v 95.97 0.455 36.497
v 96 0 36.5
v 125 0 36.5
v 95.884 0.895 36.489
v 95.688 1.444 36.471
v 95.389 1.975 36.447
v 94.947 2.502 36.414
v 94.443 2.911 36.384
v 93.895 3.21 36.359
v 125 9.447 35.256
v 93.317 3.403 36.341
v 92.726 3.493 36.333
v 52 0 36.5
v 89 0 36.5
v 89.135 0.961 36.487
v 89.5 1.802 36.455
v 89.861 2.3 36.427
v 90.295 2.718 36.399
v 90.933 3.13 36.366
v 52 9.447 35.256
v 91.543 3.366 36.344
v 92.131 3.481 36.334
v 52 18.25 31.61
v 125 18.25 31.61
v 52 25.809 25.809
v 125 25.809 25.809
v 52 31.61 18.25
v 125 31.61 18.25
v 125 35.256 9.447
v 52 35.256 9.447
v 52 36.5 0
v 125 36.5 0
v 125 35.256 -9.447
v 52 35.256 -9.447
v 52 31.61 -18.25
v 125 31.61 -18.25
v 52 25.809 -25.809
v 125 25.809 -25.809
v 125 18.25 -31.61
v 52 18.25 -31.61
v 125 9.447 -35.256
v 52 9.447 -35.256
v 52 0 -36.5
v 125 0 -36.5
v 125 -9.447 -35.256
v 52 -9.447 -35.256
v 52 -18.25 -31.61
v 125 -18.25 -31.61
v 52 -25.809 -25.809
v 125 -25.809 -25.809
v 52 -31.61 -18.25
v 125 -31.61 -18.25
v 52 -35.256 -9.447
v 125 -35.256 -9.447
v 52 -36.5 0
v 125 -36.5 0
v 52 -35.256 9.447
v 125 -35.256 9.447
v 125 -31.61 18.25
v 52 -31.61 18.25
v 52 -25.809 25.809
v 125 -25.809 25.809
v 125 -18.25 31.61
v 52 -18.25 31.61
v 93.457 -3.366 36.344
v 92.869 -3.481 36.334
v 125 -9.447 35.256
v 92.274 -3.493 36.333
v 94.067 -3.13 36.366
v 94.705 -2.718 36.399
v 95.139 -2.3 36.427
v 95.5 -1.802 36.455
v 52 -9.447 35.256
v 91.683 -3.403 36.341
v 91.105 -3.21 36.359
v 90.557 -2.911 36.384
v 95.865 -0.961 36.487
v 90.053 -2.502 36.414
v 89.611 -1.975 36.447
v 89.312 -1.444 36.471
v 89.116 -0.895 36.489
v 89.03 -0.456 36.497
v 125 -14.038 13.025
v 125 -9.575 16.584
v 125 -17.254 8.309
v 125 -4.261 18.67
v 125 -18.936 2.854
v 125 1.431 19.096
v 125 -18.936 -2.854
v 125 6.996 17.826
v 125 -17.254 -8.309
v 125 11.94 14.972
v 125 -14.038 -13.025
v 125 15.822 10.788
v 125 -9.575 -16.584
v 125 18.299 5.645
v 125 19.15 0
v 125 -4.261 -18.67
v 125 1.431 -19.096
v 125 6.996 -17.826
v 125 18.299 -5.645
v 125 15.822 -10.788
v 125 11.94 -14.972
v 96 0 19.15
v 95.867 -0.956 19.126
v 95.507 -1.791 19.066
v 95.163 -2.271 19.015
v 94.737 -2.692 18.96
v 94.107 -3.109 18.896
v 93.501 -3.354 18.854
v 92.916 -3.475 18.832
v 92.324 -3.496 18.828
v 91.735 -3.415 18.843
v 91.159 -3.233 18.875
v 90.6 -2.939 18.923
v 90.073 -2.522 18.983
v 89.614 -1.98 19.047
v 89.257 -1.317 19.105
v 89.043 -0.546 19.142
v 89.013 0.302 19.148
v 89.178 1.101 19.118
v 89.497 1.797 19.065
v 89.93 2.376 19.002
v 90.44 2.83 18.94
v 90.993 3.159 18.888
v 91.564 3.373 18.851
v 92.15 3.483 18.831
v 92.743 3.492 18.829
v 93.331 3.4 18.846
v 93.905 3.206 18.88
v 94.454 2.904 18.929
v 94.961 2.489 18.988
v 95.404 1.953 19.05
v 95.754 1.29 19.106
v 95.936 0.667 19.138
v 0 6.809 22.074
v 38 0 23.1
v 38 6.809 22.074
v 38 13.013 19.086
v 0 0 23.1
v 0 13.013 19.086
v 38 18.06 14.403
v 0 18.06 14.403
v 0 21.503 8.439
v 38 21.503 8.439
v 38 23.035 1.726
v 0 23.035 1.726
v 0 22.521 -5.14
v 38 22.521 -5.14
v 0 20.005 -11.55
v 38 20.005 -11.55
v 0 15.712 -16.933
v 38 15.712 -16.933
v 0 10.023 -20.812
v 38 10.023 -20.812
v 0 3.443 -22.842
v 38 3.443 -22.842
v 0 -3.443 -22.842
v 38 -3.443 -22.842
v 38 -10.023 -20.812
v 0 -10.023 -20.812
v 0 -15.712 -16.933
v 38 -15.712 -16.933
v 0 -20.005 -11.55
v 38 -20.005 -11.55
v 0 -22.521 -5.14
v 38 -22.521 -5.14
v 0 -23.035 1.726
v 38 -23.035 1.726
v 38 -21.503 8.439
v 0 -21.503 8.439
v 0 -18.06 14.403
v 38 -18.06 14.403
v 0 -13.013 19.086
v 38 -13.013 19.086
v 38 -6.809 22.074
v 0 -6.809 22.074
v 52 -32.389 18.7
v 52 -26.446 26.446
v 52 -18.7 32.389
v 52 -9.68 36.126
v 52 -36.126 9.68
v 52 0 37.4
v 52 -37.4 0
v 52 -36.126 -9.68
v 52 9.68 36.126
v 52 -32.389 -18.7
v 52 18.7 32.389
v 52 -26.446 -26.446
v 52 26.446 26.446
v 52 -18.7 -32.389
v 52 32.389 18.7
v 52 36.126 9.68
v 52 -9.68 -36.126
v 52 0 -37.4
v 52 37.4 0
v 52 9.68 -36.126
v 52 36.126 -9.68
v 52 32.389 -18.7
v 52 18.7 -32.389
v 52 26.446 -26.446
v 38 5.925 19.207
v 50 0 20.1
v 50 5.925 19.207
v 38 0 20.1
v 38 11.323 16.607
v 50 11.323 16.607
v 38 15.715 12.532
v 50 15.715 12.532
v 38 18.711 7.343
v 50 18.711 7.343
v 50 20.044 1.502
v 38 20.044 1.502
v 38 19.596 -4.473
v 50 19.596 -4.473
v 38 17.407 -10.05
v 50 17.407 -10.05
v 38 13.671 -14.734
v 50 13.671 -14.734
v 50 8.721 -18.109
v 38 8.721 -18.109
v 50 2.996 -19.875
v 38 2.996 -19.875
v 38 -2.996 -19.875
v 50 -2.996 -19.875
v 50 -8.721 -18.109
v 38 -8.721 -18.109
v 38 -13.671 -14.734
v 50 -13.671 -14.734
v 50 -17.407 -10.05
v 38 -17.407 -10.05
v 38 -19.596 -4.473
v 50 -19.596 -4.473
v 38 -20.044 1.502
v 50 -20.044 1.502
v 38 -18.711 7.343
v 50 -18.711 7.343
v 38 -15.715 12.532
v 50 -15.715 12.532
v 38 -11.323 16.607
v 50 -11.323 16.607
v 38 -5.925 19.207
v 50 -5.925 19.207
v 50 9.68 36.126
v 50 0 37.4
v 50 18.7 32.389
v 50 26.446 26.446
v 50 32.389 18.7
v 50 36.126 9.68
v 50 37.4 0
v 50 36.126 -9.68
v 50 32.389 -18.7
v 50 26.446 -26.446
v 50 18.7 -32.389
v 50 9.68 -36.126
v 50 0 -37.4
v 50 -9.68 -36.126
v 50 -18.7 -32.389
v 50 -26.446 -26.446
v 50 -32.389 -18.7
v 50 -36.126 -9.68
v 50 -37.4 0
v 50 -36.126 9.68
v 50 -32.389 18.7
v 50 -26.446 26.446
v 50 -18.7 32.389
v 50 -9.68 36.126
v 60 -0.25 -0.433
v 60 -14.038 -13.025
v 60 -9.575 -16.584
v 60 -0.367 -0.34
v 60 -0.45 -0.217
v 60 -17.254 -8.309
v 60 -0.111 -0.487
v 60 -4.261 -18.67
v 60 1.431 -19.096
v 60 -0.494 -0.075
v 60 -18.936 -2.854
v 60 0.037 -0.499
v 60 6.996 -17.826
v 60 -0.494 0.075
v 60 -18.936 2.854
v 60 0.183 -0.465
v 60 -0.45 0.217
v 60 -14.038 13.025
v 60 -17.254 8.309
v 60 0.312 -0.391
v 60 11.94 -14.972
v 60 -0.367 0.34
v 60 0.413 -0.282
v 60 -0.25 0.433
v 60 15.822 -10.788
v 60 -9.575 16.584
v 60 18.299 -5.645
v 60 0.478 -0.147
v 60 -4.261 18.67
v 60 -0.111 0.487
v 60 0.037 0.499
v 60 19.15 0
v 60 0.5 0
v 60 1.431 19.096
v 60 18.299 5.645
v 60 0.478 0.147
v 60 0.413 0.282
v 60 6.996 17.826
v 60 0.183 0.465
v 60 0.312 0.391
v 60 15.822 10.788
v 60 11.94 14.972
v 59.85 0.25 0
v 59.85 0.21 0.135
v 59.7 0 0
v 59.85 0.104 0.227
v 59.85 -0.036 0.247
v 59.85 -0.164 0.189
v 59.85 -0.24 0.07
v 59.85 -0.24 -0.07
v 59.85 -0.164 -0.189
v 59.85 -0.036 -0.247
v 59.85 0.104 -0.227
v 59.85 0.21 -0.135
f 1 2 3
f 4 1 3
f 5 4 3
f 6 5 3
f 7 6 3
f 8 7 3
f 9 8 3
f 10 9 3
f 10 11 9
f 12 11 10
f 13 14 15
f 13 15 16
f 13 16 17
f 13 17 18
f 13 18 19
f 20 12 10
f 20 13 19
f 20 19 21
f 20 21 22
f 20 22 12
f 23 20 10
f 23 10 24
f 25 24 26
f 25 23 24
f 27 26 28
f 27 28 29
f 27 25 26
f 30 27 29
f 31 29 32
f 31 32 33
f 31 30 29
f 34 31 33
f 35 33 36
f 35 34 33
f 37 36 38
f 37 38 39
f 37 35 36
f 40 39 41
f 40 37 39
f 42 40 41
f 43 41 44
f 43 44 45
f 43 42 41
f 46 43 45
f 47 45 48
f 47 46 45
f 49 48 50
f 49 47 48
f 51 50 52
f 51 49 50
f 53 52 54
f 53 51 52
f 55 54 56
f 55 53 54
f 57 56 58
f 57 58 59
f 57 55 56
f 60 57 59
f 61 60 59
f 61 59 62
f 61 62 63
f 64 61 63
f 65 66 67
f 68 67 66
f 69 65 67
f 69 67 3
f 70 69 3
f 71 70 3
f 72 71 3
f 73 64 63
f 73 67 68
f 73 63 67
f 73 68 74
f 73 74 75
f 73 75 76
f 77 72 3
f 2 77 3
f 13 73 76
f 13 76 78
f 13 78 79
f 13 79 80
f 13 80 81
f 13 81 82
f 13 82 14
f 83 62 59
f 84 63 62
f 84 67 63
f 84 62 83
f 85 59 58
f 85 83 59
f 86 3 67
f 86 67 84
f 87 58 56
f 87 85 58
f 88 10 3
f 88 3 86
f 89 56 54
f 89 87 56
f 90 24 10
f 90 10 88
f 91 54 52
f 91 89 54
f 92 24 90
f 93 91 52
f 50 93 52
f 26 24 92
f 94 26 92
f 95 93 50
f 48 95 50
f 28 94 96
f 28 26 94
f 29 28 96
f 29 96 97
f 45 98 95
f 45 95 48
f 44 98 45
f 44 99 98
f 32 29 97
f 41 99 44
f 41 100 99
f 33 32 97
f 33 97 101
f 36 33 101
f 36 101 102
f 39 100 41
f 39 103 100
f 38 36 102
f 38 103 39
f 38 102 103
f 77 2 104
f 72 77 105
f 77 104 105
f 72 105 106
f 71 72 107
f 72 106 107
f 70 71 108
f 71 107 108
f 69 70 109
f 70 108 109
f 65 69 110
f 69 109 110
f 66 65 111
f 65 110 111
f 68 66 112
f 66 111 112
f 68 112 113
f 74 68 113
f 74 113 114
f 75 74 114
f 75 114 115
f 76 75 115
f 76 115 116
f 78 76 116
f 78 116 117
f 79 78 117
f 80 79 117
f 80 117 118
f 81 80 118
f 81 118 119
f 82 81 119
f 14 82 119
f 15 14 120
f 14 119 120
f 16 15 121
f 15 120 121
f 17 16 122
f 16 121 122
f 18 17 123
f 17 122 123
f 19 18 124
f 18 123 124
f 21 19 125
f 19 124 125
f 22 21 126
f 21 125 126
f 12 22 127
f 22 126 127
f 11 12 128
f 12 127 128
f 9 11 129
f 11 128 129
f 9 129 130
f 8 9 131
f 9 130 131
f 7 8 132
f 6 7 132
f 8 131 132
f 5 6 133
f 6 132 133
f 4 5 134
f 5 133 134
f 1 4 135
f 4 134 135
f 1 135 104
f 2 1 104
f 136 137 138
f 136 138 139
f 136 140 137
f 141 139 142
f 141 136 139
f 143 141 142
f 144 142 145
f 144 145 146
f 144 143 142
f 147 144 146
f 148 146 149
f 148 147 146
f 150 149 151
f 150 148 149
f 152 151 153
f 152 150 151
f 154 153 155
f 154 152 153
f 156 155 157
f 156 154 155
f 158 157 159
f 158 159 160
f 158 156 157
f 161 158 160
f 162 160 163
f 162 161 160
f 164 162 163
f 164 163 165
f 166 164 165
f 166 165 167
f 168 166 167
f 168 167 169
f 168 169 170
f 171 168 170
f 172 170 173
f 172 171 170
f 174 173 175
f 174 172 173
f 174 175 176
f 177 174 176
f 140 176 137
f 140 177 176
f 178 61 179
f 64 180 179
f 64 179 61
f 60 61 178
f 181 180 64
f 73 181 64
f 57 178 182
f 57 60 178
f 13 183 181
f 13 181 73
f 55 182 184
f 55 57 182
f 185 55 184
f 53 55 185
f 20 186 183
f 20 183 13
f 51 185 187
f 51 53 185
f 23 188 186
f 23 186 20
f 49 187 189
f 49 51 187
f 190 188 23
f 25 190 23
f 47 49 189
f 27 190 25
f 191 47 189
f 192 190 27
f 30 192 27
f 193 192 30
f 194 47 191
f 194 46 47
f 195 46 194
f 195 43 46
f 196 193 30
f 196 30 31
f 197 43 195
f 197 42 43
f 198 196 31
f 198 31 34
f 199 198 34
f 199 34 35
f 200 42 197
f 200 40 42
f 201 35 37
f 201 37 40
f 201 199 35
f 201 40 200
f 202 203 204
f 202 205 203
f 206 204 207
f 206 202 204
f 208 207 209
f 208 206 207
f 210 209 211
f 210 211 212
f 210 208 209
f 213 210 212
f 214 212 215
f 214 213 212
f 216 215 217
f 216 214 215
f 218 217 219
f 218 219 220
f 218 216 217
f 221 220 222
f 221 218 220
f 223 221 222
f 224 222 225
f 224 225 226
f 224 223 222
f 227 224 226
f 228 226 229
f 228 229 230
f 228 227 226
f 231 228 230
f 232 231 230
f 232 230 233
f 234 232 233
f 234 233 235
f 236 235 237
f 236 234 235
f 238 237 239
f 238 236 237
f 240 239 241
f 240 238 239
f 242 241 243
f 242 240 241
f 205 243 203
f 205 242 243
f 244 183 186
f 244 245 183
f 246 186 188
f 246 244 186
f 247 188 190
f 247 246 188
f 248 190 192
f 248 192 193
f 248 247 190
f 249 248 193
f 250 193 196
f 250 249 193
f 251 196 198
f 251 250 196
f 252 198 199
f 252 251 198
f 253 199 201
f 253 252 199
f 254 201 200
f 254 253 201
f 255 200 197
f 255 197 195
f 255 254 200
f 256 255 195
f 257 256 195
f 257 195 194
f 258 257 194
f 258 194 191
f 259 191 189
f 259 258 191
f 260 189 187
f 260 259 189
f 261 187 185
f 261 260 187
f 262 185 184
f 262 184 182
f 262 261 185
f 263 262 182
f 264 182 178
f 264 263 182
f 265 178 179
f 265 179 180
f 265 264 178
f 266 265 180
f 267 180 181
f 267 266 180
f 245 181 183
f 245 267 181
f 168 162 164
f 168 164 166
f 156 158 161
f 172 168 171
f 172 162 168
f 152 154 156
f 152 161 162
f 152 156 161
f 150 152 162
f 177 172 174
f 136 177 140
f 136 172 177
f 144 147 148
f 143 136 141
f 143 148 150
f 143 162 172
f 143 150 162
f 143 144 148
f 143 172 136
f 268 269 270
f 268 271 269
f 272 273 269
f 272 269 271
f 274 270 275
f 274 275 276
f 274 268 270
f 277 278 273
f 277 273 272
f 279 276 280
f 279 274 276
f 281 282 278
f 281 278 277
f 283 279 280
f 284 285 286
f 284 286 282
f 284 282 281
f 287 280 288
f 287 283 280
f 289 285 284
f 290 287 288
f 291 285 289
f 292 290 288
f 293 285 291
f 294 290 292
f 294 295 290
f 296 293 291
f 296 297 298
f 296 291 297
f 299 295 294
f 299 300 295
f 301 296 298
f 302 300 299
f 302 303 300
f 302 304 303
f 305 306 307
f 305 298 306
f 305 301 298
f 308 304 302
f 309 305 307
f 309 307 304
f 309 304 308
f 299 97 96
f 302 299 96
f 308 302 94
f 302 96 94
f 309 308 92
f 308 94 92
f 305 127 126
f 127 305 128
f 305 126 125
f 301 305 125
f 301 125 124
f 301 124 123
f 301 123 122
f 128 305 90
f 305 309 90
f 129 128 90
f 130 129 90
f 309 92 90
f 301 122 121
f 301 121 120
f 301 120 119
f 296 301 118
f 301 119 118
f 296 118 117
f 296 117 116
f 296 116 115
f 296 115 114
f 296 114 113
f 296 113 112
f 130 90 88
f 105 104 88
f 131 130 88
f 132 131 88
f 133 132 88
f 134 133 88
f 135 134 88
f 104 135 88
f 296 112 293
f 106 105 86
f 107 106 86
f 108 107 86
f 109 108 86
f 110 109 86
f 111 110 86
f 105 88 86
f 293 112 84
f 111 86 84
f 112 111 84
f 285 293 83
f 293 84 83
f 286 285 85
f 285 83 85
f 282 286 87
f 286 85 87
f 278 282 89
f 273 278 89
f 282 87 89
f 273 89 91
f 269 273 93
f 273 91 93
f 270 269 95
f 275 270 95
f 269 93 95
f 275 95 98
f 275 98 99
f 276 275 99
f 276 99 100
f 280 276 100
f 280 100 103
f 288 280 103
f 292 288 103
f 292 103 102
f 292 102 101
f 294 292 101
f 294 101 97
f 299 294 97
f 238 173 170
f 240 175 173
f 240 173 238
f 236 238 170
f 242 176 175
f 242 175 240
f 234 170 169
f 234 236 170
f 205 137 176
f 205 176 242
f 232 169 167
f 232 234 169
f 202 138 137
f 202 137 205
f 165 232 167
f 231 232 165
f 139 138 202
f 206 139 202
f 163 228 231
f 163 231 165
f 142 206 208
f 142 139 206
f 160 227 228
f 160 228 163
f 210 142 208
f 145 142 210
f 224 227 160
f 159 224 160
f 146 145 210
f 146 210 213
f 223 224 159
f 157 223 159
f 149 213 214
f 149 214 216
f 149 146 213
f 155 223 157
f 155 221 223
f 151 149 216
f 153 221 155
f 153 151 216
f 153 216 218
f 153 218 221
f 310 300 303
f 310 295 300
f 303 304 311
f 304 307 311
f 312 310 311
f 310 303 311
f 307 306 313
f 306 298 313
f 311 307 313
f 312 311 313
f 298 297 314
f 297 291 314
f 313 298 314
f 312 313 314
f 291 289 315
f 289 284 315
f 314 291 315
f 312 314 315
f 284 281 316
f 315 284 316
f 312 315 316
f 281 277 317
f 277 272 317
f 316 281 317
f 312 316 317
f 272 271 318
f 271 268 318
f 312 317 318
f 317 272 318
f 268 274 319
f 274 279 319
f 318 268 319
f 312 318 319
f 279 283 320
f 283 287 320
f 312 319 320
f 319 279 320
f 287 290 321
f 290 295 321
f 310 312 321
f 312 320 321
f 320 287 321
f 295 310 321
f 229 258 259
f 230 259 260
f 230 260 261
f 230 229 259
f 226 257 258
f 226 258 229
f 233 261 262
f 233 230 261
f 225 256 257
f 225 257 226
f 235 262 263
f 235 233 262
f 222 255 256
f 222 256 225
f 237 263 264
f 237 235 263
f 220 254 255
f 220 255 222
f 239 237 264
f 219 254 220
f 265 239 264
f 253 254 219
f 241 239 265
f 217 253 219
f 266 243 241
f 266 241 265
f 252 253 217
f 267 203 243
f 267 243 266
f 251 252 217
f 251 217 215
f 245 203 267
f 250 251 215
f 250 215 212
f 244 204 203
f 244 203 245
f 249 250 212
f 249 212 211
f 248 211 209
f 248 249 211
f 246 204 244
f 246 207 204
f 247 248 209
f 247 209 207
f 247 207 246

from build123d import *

# Parameters (mm, degrees)
F3_D           = 1
F3_DEPTH       = 65
F3_CBORE_D     = 38.3
F3_CBORE_DEPTH = 65
F3_TIP         = 0.3004303095
F5_D           = 7
F5_DEPTH       = 37.401


# Not quite as in the source:
# - a feature names something its author has since deleted; it is built from what else it names


with BuildPart() as f1:
    # F0 (on Front) → F1 (revolve)
    with BuildSketch(Plane.XZ):
        Polygon((0, 23.1), (0, 0), (125, 0), (125, 36.5), (52, 36.5), (52, 37.4), (50, 37.4), (50, 36.5), (50, 20.1), (38, 20.1), (38, 23.1), align=None)
    revolve(axis=Axis((62.5, 0, 0), (-1, 0, 0)))

    # F3
    with Locations(Plane.YZ.offset(125)):
        with Locations((0, 0)):
            CounterBoreHole(F3_D / 2, F3_CBORE_D / 2, F3_CBORE_DEPTH, depth=F3_DEPTH)
            with Locations((0, 0, -(F3_DEPTH + F3_TIP / 2))):  # 118° drill point
                Cone(0, F3_D / 2, F3_TIP, mode=Mode.SUBTRACT)

    # F5 (through all, one way)
    with BuildSketch(Plane(origin=(0, 0, 0), x_dir=(1, 0, 0), z_dir=(0, 0, -1))):
        with Locations((92.5, 0)):
            Circle(F5_D / 2)
    extrude(amount=-F5_DEPTH, mode=Mode.SUBTRACT)


solid = f1.part
